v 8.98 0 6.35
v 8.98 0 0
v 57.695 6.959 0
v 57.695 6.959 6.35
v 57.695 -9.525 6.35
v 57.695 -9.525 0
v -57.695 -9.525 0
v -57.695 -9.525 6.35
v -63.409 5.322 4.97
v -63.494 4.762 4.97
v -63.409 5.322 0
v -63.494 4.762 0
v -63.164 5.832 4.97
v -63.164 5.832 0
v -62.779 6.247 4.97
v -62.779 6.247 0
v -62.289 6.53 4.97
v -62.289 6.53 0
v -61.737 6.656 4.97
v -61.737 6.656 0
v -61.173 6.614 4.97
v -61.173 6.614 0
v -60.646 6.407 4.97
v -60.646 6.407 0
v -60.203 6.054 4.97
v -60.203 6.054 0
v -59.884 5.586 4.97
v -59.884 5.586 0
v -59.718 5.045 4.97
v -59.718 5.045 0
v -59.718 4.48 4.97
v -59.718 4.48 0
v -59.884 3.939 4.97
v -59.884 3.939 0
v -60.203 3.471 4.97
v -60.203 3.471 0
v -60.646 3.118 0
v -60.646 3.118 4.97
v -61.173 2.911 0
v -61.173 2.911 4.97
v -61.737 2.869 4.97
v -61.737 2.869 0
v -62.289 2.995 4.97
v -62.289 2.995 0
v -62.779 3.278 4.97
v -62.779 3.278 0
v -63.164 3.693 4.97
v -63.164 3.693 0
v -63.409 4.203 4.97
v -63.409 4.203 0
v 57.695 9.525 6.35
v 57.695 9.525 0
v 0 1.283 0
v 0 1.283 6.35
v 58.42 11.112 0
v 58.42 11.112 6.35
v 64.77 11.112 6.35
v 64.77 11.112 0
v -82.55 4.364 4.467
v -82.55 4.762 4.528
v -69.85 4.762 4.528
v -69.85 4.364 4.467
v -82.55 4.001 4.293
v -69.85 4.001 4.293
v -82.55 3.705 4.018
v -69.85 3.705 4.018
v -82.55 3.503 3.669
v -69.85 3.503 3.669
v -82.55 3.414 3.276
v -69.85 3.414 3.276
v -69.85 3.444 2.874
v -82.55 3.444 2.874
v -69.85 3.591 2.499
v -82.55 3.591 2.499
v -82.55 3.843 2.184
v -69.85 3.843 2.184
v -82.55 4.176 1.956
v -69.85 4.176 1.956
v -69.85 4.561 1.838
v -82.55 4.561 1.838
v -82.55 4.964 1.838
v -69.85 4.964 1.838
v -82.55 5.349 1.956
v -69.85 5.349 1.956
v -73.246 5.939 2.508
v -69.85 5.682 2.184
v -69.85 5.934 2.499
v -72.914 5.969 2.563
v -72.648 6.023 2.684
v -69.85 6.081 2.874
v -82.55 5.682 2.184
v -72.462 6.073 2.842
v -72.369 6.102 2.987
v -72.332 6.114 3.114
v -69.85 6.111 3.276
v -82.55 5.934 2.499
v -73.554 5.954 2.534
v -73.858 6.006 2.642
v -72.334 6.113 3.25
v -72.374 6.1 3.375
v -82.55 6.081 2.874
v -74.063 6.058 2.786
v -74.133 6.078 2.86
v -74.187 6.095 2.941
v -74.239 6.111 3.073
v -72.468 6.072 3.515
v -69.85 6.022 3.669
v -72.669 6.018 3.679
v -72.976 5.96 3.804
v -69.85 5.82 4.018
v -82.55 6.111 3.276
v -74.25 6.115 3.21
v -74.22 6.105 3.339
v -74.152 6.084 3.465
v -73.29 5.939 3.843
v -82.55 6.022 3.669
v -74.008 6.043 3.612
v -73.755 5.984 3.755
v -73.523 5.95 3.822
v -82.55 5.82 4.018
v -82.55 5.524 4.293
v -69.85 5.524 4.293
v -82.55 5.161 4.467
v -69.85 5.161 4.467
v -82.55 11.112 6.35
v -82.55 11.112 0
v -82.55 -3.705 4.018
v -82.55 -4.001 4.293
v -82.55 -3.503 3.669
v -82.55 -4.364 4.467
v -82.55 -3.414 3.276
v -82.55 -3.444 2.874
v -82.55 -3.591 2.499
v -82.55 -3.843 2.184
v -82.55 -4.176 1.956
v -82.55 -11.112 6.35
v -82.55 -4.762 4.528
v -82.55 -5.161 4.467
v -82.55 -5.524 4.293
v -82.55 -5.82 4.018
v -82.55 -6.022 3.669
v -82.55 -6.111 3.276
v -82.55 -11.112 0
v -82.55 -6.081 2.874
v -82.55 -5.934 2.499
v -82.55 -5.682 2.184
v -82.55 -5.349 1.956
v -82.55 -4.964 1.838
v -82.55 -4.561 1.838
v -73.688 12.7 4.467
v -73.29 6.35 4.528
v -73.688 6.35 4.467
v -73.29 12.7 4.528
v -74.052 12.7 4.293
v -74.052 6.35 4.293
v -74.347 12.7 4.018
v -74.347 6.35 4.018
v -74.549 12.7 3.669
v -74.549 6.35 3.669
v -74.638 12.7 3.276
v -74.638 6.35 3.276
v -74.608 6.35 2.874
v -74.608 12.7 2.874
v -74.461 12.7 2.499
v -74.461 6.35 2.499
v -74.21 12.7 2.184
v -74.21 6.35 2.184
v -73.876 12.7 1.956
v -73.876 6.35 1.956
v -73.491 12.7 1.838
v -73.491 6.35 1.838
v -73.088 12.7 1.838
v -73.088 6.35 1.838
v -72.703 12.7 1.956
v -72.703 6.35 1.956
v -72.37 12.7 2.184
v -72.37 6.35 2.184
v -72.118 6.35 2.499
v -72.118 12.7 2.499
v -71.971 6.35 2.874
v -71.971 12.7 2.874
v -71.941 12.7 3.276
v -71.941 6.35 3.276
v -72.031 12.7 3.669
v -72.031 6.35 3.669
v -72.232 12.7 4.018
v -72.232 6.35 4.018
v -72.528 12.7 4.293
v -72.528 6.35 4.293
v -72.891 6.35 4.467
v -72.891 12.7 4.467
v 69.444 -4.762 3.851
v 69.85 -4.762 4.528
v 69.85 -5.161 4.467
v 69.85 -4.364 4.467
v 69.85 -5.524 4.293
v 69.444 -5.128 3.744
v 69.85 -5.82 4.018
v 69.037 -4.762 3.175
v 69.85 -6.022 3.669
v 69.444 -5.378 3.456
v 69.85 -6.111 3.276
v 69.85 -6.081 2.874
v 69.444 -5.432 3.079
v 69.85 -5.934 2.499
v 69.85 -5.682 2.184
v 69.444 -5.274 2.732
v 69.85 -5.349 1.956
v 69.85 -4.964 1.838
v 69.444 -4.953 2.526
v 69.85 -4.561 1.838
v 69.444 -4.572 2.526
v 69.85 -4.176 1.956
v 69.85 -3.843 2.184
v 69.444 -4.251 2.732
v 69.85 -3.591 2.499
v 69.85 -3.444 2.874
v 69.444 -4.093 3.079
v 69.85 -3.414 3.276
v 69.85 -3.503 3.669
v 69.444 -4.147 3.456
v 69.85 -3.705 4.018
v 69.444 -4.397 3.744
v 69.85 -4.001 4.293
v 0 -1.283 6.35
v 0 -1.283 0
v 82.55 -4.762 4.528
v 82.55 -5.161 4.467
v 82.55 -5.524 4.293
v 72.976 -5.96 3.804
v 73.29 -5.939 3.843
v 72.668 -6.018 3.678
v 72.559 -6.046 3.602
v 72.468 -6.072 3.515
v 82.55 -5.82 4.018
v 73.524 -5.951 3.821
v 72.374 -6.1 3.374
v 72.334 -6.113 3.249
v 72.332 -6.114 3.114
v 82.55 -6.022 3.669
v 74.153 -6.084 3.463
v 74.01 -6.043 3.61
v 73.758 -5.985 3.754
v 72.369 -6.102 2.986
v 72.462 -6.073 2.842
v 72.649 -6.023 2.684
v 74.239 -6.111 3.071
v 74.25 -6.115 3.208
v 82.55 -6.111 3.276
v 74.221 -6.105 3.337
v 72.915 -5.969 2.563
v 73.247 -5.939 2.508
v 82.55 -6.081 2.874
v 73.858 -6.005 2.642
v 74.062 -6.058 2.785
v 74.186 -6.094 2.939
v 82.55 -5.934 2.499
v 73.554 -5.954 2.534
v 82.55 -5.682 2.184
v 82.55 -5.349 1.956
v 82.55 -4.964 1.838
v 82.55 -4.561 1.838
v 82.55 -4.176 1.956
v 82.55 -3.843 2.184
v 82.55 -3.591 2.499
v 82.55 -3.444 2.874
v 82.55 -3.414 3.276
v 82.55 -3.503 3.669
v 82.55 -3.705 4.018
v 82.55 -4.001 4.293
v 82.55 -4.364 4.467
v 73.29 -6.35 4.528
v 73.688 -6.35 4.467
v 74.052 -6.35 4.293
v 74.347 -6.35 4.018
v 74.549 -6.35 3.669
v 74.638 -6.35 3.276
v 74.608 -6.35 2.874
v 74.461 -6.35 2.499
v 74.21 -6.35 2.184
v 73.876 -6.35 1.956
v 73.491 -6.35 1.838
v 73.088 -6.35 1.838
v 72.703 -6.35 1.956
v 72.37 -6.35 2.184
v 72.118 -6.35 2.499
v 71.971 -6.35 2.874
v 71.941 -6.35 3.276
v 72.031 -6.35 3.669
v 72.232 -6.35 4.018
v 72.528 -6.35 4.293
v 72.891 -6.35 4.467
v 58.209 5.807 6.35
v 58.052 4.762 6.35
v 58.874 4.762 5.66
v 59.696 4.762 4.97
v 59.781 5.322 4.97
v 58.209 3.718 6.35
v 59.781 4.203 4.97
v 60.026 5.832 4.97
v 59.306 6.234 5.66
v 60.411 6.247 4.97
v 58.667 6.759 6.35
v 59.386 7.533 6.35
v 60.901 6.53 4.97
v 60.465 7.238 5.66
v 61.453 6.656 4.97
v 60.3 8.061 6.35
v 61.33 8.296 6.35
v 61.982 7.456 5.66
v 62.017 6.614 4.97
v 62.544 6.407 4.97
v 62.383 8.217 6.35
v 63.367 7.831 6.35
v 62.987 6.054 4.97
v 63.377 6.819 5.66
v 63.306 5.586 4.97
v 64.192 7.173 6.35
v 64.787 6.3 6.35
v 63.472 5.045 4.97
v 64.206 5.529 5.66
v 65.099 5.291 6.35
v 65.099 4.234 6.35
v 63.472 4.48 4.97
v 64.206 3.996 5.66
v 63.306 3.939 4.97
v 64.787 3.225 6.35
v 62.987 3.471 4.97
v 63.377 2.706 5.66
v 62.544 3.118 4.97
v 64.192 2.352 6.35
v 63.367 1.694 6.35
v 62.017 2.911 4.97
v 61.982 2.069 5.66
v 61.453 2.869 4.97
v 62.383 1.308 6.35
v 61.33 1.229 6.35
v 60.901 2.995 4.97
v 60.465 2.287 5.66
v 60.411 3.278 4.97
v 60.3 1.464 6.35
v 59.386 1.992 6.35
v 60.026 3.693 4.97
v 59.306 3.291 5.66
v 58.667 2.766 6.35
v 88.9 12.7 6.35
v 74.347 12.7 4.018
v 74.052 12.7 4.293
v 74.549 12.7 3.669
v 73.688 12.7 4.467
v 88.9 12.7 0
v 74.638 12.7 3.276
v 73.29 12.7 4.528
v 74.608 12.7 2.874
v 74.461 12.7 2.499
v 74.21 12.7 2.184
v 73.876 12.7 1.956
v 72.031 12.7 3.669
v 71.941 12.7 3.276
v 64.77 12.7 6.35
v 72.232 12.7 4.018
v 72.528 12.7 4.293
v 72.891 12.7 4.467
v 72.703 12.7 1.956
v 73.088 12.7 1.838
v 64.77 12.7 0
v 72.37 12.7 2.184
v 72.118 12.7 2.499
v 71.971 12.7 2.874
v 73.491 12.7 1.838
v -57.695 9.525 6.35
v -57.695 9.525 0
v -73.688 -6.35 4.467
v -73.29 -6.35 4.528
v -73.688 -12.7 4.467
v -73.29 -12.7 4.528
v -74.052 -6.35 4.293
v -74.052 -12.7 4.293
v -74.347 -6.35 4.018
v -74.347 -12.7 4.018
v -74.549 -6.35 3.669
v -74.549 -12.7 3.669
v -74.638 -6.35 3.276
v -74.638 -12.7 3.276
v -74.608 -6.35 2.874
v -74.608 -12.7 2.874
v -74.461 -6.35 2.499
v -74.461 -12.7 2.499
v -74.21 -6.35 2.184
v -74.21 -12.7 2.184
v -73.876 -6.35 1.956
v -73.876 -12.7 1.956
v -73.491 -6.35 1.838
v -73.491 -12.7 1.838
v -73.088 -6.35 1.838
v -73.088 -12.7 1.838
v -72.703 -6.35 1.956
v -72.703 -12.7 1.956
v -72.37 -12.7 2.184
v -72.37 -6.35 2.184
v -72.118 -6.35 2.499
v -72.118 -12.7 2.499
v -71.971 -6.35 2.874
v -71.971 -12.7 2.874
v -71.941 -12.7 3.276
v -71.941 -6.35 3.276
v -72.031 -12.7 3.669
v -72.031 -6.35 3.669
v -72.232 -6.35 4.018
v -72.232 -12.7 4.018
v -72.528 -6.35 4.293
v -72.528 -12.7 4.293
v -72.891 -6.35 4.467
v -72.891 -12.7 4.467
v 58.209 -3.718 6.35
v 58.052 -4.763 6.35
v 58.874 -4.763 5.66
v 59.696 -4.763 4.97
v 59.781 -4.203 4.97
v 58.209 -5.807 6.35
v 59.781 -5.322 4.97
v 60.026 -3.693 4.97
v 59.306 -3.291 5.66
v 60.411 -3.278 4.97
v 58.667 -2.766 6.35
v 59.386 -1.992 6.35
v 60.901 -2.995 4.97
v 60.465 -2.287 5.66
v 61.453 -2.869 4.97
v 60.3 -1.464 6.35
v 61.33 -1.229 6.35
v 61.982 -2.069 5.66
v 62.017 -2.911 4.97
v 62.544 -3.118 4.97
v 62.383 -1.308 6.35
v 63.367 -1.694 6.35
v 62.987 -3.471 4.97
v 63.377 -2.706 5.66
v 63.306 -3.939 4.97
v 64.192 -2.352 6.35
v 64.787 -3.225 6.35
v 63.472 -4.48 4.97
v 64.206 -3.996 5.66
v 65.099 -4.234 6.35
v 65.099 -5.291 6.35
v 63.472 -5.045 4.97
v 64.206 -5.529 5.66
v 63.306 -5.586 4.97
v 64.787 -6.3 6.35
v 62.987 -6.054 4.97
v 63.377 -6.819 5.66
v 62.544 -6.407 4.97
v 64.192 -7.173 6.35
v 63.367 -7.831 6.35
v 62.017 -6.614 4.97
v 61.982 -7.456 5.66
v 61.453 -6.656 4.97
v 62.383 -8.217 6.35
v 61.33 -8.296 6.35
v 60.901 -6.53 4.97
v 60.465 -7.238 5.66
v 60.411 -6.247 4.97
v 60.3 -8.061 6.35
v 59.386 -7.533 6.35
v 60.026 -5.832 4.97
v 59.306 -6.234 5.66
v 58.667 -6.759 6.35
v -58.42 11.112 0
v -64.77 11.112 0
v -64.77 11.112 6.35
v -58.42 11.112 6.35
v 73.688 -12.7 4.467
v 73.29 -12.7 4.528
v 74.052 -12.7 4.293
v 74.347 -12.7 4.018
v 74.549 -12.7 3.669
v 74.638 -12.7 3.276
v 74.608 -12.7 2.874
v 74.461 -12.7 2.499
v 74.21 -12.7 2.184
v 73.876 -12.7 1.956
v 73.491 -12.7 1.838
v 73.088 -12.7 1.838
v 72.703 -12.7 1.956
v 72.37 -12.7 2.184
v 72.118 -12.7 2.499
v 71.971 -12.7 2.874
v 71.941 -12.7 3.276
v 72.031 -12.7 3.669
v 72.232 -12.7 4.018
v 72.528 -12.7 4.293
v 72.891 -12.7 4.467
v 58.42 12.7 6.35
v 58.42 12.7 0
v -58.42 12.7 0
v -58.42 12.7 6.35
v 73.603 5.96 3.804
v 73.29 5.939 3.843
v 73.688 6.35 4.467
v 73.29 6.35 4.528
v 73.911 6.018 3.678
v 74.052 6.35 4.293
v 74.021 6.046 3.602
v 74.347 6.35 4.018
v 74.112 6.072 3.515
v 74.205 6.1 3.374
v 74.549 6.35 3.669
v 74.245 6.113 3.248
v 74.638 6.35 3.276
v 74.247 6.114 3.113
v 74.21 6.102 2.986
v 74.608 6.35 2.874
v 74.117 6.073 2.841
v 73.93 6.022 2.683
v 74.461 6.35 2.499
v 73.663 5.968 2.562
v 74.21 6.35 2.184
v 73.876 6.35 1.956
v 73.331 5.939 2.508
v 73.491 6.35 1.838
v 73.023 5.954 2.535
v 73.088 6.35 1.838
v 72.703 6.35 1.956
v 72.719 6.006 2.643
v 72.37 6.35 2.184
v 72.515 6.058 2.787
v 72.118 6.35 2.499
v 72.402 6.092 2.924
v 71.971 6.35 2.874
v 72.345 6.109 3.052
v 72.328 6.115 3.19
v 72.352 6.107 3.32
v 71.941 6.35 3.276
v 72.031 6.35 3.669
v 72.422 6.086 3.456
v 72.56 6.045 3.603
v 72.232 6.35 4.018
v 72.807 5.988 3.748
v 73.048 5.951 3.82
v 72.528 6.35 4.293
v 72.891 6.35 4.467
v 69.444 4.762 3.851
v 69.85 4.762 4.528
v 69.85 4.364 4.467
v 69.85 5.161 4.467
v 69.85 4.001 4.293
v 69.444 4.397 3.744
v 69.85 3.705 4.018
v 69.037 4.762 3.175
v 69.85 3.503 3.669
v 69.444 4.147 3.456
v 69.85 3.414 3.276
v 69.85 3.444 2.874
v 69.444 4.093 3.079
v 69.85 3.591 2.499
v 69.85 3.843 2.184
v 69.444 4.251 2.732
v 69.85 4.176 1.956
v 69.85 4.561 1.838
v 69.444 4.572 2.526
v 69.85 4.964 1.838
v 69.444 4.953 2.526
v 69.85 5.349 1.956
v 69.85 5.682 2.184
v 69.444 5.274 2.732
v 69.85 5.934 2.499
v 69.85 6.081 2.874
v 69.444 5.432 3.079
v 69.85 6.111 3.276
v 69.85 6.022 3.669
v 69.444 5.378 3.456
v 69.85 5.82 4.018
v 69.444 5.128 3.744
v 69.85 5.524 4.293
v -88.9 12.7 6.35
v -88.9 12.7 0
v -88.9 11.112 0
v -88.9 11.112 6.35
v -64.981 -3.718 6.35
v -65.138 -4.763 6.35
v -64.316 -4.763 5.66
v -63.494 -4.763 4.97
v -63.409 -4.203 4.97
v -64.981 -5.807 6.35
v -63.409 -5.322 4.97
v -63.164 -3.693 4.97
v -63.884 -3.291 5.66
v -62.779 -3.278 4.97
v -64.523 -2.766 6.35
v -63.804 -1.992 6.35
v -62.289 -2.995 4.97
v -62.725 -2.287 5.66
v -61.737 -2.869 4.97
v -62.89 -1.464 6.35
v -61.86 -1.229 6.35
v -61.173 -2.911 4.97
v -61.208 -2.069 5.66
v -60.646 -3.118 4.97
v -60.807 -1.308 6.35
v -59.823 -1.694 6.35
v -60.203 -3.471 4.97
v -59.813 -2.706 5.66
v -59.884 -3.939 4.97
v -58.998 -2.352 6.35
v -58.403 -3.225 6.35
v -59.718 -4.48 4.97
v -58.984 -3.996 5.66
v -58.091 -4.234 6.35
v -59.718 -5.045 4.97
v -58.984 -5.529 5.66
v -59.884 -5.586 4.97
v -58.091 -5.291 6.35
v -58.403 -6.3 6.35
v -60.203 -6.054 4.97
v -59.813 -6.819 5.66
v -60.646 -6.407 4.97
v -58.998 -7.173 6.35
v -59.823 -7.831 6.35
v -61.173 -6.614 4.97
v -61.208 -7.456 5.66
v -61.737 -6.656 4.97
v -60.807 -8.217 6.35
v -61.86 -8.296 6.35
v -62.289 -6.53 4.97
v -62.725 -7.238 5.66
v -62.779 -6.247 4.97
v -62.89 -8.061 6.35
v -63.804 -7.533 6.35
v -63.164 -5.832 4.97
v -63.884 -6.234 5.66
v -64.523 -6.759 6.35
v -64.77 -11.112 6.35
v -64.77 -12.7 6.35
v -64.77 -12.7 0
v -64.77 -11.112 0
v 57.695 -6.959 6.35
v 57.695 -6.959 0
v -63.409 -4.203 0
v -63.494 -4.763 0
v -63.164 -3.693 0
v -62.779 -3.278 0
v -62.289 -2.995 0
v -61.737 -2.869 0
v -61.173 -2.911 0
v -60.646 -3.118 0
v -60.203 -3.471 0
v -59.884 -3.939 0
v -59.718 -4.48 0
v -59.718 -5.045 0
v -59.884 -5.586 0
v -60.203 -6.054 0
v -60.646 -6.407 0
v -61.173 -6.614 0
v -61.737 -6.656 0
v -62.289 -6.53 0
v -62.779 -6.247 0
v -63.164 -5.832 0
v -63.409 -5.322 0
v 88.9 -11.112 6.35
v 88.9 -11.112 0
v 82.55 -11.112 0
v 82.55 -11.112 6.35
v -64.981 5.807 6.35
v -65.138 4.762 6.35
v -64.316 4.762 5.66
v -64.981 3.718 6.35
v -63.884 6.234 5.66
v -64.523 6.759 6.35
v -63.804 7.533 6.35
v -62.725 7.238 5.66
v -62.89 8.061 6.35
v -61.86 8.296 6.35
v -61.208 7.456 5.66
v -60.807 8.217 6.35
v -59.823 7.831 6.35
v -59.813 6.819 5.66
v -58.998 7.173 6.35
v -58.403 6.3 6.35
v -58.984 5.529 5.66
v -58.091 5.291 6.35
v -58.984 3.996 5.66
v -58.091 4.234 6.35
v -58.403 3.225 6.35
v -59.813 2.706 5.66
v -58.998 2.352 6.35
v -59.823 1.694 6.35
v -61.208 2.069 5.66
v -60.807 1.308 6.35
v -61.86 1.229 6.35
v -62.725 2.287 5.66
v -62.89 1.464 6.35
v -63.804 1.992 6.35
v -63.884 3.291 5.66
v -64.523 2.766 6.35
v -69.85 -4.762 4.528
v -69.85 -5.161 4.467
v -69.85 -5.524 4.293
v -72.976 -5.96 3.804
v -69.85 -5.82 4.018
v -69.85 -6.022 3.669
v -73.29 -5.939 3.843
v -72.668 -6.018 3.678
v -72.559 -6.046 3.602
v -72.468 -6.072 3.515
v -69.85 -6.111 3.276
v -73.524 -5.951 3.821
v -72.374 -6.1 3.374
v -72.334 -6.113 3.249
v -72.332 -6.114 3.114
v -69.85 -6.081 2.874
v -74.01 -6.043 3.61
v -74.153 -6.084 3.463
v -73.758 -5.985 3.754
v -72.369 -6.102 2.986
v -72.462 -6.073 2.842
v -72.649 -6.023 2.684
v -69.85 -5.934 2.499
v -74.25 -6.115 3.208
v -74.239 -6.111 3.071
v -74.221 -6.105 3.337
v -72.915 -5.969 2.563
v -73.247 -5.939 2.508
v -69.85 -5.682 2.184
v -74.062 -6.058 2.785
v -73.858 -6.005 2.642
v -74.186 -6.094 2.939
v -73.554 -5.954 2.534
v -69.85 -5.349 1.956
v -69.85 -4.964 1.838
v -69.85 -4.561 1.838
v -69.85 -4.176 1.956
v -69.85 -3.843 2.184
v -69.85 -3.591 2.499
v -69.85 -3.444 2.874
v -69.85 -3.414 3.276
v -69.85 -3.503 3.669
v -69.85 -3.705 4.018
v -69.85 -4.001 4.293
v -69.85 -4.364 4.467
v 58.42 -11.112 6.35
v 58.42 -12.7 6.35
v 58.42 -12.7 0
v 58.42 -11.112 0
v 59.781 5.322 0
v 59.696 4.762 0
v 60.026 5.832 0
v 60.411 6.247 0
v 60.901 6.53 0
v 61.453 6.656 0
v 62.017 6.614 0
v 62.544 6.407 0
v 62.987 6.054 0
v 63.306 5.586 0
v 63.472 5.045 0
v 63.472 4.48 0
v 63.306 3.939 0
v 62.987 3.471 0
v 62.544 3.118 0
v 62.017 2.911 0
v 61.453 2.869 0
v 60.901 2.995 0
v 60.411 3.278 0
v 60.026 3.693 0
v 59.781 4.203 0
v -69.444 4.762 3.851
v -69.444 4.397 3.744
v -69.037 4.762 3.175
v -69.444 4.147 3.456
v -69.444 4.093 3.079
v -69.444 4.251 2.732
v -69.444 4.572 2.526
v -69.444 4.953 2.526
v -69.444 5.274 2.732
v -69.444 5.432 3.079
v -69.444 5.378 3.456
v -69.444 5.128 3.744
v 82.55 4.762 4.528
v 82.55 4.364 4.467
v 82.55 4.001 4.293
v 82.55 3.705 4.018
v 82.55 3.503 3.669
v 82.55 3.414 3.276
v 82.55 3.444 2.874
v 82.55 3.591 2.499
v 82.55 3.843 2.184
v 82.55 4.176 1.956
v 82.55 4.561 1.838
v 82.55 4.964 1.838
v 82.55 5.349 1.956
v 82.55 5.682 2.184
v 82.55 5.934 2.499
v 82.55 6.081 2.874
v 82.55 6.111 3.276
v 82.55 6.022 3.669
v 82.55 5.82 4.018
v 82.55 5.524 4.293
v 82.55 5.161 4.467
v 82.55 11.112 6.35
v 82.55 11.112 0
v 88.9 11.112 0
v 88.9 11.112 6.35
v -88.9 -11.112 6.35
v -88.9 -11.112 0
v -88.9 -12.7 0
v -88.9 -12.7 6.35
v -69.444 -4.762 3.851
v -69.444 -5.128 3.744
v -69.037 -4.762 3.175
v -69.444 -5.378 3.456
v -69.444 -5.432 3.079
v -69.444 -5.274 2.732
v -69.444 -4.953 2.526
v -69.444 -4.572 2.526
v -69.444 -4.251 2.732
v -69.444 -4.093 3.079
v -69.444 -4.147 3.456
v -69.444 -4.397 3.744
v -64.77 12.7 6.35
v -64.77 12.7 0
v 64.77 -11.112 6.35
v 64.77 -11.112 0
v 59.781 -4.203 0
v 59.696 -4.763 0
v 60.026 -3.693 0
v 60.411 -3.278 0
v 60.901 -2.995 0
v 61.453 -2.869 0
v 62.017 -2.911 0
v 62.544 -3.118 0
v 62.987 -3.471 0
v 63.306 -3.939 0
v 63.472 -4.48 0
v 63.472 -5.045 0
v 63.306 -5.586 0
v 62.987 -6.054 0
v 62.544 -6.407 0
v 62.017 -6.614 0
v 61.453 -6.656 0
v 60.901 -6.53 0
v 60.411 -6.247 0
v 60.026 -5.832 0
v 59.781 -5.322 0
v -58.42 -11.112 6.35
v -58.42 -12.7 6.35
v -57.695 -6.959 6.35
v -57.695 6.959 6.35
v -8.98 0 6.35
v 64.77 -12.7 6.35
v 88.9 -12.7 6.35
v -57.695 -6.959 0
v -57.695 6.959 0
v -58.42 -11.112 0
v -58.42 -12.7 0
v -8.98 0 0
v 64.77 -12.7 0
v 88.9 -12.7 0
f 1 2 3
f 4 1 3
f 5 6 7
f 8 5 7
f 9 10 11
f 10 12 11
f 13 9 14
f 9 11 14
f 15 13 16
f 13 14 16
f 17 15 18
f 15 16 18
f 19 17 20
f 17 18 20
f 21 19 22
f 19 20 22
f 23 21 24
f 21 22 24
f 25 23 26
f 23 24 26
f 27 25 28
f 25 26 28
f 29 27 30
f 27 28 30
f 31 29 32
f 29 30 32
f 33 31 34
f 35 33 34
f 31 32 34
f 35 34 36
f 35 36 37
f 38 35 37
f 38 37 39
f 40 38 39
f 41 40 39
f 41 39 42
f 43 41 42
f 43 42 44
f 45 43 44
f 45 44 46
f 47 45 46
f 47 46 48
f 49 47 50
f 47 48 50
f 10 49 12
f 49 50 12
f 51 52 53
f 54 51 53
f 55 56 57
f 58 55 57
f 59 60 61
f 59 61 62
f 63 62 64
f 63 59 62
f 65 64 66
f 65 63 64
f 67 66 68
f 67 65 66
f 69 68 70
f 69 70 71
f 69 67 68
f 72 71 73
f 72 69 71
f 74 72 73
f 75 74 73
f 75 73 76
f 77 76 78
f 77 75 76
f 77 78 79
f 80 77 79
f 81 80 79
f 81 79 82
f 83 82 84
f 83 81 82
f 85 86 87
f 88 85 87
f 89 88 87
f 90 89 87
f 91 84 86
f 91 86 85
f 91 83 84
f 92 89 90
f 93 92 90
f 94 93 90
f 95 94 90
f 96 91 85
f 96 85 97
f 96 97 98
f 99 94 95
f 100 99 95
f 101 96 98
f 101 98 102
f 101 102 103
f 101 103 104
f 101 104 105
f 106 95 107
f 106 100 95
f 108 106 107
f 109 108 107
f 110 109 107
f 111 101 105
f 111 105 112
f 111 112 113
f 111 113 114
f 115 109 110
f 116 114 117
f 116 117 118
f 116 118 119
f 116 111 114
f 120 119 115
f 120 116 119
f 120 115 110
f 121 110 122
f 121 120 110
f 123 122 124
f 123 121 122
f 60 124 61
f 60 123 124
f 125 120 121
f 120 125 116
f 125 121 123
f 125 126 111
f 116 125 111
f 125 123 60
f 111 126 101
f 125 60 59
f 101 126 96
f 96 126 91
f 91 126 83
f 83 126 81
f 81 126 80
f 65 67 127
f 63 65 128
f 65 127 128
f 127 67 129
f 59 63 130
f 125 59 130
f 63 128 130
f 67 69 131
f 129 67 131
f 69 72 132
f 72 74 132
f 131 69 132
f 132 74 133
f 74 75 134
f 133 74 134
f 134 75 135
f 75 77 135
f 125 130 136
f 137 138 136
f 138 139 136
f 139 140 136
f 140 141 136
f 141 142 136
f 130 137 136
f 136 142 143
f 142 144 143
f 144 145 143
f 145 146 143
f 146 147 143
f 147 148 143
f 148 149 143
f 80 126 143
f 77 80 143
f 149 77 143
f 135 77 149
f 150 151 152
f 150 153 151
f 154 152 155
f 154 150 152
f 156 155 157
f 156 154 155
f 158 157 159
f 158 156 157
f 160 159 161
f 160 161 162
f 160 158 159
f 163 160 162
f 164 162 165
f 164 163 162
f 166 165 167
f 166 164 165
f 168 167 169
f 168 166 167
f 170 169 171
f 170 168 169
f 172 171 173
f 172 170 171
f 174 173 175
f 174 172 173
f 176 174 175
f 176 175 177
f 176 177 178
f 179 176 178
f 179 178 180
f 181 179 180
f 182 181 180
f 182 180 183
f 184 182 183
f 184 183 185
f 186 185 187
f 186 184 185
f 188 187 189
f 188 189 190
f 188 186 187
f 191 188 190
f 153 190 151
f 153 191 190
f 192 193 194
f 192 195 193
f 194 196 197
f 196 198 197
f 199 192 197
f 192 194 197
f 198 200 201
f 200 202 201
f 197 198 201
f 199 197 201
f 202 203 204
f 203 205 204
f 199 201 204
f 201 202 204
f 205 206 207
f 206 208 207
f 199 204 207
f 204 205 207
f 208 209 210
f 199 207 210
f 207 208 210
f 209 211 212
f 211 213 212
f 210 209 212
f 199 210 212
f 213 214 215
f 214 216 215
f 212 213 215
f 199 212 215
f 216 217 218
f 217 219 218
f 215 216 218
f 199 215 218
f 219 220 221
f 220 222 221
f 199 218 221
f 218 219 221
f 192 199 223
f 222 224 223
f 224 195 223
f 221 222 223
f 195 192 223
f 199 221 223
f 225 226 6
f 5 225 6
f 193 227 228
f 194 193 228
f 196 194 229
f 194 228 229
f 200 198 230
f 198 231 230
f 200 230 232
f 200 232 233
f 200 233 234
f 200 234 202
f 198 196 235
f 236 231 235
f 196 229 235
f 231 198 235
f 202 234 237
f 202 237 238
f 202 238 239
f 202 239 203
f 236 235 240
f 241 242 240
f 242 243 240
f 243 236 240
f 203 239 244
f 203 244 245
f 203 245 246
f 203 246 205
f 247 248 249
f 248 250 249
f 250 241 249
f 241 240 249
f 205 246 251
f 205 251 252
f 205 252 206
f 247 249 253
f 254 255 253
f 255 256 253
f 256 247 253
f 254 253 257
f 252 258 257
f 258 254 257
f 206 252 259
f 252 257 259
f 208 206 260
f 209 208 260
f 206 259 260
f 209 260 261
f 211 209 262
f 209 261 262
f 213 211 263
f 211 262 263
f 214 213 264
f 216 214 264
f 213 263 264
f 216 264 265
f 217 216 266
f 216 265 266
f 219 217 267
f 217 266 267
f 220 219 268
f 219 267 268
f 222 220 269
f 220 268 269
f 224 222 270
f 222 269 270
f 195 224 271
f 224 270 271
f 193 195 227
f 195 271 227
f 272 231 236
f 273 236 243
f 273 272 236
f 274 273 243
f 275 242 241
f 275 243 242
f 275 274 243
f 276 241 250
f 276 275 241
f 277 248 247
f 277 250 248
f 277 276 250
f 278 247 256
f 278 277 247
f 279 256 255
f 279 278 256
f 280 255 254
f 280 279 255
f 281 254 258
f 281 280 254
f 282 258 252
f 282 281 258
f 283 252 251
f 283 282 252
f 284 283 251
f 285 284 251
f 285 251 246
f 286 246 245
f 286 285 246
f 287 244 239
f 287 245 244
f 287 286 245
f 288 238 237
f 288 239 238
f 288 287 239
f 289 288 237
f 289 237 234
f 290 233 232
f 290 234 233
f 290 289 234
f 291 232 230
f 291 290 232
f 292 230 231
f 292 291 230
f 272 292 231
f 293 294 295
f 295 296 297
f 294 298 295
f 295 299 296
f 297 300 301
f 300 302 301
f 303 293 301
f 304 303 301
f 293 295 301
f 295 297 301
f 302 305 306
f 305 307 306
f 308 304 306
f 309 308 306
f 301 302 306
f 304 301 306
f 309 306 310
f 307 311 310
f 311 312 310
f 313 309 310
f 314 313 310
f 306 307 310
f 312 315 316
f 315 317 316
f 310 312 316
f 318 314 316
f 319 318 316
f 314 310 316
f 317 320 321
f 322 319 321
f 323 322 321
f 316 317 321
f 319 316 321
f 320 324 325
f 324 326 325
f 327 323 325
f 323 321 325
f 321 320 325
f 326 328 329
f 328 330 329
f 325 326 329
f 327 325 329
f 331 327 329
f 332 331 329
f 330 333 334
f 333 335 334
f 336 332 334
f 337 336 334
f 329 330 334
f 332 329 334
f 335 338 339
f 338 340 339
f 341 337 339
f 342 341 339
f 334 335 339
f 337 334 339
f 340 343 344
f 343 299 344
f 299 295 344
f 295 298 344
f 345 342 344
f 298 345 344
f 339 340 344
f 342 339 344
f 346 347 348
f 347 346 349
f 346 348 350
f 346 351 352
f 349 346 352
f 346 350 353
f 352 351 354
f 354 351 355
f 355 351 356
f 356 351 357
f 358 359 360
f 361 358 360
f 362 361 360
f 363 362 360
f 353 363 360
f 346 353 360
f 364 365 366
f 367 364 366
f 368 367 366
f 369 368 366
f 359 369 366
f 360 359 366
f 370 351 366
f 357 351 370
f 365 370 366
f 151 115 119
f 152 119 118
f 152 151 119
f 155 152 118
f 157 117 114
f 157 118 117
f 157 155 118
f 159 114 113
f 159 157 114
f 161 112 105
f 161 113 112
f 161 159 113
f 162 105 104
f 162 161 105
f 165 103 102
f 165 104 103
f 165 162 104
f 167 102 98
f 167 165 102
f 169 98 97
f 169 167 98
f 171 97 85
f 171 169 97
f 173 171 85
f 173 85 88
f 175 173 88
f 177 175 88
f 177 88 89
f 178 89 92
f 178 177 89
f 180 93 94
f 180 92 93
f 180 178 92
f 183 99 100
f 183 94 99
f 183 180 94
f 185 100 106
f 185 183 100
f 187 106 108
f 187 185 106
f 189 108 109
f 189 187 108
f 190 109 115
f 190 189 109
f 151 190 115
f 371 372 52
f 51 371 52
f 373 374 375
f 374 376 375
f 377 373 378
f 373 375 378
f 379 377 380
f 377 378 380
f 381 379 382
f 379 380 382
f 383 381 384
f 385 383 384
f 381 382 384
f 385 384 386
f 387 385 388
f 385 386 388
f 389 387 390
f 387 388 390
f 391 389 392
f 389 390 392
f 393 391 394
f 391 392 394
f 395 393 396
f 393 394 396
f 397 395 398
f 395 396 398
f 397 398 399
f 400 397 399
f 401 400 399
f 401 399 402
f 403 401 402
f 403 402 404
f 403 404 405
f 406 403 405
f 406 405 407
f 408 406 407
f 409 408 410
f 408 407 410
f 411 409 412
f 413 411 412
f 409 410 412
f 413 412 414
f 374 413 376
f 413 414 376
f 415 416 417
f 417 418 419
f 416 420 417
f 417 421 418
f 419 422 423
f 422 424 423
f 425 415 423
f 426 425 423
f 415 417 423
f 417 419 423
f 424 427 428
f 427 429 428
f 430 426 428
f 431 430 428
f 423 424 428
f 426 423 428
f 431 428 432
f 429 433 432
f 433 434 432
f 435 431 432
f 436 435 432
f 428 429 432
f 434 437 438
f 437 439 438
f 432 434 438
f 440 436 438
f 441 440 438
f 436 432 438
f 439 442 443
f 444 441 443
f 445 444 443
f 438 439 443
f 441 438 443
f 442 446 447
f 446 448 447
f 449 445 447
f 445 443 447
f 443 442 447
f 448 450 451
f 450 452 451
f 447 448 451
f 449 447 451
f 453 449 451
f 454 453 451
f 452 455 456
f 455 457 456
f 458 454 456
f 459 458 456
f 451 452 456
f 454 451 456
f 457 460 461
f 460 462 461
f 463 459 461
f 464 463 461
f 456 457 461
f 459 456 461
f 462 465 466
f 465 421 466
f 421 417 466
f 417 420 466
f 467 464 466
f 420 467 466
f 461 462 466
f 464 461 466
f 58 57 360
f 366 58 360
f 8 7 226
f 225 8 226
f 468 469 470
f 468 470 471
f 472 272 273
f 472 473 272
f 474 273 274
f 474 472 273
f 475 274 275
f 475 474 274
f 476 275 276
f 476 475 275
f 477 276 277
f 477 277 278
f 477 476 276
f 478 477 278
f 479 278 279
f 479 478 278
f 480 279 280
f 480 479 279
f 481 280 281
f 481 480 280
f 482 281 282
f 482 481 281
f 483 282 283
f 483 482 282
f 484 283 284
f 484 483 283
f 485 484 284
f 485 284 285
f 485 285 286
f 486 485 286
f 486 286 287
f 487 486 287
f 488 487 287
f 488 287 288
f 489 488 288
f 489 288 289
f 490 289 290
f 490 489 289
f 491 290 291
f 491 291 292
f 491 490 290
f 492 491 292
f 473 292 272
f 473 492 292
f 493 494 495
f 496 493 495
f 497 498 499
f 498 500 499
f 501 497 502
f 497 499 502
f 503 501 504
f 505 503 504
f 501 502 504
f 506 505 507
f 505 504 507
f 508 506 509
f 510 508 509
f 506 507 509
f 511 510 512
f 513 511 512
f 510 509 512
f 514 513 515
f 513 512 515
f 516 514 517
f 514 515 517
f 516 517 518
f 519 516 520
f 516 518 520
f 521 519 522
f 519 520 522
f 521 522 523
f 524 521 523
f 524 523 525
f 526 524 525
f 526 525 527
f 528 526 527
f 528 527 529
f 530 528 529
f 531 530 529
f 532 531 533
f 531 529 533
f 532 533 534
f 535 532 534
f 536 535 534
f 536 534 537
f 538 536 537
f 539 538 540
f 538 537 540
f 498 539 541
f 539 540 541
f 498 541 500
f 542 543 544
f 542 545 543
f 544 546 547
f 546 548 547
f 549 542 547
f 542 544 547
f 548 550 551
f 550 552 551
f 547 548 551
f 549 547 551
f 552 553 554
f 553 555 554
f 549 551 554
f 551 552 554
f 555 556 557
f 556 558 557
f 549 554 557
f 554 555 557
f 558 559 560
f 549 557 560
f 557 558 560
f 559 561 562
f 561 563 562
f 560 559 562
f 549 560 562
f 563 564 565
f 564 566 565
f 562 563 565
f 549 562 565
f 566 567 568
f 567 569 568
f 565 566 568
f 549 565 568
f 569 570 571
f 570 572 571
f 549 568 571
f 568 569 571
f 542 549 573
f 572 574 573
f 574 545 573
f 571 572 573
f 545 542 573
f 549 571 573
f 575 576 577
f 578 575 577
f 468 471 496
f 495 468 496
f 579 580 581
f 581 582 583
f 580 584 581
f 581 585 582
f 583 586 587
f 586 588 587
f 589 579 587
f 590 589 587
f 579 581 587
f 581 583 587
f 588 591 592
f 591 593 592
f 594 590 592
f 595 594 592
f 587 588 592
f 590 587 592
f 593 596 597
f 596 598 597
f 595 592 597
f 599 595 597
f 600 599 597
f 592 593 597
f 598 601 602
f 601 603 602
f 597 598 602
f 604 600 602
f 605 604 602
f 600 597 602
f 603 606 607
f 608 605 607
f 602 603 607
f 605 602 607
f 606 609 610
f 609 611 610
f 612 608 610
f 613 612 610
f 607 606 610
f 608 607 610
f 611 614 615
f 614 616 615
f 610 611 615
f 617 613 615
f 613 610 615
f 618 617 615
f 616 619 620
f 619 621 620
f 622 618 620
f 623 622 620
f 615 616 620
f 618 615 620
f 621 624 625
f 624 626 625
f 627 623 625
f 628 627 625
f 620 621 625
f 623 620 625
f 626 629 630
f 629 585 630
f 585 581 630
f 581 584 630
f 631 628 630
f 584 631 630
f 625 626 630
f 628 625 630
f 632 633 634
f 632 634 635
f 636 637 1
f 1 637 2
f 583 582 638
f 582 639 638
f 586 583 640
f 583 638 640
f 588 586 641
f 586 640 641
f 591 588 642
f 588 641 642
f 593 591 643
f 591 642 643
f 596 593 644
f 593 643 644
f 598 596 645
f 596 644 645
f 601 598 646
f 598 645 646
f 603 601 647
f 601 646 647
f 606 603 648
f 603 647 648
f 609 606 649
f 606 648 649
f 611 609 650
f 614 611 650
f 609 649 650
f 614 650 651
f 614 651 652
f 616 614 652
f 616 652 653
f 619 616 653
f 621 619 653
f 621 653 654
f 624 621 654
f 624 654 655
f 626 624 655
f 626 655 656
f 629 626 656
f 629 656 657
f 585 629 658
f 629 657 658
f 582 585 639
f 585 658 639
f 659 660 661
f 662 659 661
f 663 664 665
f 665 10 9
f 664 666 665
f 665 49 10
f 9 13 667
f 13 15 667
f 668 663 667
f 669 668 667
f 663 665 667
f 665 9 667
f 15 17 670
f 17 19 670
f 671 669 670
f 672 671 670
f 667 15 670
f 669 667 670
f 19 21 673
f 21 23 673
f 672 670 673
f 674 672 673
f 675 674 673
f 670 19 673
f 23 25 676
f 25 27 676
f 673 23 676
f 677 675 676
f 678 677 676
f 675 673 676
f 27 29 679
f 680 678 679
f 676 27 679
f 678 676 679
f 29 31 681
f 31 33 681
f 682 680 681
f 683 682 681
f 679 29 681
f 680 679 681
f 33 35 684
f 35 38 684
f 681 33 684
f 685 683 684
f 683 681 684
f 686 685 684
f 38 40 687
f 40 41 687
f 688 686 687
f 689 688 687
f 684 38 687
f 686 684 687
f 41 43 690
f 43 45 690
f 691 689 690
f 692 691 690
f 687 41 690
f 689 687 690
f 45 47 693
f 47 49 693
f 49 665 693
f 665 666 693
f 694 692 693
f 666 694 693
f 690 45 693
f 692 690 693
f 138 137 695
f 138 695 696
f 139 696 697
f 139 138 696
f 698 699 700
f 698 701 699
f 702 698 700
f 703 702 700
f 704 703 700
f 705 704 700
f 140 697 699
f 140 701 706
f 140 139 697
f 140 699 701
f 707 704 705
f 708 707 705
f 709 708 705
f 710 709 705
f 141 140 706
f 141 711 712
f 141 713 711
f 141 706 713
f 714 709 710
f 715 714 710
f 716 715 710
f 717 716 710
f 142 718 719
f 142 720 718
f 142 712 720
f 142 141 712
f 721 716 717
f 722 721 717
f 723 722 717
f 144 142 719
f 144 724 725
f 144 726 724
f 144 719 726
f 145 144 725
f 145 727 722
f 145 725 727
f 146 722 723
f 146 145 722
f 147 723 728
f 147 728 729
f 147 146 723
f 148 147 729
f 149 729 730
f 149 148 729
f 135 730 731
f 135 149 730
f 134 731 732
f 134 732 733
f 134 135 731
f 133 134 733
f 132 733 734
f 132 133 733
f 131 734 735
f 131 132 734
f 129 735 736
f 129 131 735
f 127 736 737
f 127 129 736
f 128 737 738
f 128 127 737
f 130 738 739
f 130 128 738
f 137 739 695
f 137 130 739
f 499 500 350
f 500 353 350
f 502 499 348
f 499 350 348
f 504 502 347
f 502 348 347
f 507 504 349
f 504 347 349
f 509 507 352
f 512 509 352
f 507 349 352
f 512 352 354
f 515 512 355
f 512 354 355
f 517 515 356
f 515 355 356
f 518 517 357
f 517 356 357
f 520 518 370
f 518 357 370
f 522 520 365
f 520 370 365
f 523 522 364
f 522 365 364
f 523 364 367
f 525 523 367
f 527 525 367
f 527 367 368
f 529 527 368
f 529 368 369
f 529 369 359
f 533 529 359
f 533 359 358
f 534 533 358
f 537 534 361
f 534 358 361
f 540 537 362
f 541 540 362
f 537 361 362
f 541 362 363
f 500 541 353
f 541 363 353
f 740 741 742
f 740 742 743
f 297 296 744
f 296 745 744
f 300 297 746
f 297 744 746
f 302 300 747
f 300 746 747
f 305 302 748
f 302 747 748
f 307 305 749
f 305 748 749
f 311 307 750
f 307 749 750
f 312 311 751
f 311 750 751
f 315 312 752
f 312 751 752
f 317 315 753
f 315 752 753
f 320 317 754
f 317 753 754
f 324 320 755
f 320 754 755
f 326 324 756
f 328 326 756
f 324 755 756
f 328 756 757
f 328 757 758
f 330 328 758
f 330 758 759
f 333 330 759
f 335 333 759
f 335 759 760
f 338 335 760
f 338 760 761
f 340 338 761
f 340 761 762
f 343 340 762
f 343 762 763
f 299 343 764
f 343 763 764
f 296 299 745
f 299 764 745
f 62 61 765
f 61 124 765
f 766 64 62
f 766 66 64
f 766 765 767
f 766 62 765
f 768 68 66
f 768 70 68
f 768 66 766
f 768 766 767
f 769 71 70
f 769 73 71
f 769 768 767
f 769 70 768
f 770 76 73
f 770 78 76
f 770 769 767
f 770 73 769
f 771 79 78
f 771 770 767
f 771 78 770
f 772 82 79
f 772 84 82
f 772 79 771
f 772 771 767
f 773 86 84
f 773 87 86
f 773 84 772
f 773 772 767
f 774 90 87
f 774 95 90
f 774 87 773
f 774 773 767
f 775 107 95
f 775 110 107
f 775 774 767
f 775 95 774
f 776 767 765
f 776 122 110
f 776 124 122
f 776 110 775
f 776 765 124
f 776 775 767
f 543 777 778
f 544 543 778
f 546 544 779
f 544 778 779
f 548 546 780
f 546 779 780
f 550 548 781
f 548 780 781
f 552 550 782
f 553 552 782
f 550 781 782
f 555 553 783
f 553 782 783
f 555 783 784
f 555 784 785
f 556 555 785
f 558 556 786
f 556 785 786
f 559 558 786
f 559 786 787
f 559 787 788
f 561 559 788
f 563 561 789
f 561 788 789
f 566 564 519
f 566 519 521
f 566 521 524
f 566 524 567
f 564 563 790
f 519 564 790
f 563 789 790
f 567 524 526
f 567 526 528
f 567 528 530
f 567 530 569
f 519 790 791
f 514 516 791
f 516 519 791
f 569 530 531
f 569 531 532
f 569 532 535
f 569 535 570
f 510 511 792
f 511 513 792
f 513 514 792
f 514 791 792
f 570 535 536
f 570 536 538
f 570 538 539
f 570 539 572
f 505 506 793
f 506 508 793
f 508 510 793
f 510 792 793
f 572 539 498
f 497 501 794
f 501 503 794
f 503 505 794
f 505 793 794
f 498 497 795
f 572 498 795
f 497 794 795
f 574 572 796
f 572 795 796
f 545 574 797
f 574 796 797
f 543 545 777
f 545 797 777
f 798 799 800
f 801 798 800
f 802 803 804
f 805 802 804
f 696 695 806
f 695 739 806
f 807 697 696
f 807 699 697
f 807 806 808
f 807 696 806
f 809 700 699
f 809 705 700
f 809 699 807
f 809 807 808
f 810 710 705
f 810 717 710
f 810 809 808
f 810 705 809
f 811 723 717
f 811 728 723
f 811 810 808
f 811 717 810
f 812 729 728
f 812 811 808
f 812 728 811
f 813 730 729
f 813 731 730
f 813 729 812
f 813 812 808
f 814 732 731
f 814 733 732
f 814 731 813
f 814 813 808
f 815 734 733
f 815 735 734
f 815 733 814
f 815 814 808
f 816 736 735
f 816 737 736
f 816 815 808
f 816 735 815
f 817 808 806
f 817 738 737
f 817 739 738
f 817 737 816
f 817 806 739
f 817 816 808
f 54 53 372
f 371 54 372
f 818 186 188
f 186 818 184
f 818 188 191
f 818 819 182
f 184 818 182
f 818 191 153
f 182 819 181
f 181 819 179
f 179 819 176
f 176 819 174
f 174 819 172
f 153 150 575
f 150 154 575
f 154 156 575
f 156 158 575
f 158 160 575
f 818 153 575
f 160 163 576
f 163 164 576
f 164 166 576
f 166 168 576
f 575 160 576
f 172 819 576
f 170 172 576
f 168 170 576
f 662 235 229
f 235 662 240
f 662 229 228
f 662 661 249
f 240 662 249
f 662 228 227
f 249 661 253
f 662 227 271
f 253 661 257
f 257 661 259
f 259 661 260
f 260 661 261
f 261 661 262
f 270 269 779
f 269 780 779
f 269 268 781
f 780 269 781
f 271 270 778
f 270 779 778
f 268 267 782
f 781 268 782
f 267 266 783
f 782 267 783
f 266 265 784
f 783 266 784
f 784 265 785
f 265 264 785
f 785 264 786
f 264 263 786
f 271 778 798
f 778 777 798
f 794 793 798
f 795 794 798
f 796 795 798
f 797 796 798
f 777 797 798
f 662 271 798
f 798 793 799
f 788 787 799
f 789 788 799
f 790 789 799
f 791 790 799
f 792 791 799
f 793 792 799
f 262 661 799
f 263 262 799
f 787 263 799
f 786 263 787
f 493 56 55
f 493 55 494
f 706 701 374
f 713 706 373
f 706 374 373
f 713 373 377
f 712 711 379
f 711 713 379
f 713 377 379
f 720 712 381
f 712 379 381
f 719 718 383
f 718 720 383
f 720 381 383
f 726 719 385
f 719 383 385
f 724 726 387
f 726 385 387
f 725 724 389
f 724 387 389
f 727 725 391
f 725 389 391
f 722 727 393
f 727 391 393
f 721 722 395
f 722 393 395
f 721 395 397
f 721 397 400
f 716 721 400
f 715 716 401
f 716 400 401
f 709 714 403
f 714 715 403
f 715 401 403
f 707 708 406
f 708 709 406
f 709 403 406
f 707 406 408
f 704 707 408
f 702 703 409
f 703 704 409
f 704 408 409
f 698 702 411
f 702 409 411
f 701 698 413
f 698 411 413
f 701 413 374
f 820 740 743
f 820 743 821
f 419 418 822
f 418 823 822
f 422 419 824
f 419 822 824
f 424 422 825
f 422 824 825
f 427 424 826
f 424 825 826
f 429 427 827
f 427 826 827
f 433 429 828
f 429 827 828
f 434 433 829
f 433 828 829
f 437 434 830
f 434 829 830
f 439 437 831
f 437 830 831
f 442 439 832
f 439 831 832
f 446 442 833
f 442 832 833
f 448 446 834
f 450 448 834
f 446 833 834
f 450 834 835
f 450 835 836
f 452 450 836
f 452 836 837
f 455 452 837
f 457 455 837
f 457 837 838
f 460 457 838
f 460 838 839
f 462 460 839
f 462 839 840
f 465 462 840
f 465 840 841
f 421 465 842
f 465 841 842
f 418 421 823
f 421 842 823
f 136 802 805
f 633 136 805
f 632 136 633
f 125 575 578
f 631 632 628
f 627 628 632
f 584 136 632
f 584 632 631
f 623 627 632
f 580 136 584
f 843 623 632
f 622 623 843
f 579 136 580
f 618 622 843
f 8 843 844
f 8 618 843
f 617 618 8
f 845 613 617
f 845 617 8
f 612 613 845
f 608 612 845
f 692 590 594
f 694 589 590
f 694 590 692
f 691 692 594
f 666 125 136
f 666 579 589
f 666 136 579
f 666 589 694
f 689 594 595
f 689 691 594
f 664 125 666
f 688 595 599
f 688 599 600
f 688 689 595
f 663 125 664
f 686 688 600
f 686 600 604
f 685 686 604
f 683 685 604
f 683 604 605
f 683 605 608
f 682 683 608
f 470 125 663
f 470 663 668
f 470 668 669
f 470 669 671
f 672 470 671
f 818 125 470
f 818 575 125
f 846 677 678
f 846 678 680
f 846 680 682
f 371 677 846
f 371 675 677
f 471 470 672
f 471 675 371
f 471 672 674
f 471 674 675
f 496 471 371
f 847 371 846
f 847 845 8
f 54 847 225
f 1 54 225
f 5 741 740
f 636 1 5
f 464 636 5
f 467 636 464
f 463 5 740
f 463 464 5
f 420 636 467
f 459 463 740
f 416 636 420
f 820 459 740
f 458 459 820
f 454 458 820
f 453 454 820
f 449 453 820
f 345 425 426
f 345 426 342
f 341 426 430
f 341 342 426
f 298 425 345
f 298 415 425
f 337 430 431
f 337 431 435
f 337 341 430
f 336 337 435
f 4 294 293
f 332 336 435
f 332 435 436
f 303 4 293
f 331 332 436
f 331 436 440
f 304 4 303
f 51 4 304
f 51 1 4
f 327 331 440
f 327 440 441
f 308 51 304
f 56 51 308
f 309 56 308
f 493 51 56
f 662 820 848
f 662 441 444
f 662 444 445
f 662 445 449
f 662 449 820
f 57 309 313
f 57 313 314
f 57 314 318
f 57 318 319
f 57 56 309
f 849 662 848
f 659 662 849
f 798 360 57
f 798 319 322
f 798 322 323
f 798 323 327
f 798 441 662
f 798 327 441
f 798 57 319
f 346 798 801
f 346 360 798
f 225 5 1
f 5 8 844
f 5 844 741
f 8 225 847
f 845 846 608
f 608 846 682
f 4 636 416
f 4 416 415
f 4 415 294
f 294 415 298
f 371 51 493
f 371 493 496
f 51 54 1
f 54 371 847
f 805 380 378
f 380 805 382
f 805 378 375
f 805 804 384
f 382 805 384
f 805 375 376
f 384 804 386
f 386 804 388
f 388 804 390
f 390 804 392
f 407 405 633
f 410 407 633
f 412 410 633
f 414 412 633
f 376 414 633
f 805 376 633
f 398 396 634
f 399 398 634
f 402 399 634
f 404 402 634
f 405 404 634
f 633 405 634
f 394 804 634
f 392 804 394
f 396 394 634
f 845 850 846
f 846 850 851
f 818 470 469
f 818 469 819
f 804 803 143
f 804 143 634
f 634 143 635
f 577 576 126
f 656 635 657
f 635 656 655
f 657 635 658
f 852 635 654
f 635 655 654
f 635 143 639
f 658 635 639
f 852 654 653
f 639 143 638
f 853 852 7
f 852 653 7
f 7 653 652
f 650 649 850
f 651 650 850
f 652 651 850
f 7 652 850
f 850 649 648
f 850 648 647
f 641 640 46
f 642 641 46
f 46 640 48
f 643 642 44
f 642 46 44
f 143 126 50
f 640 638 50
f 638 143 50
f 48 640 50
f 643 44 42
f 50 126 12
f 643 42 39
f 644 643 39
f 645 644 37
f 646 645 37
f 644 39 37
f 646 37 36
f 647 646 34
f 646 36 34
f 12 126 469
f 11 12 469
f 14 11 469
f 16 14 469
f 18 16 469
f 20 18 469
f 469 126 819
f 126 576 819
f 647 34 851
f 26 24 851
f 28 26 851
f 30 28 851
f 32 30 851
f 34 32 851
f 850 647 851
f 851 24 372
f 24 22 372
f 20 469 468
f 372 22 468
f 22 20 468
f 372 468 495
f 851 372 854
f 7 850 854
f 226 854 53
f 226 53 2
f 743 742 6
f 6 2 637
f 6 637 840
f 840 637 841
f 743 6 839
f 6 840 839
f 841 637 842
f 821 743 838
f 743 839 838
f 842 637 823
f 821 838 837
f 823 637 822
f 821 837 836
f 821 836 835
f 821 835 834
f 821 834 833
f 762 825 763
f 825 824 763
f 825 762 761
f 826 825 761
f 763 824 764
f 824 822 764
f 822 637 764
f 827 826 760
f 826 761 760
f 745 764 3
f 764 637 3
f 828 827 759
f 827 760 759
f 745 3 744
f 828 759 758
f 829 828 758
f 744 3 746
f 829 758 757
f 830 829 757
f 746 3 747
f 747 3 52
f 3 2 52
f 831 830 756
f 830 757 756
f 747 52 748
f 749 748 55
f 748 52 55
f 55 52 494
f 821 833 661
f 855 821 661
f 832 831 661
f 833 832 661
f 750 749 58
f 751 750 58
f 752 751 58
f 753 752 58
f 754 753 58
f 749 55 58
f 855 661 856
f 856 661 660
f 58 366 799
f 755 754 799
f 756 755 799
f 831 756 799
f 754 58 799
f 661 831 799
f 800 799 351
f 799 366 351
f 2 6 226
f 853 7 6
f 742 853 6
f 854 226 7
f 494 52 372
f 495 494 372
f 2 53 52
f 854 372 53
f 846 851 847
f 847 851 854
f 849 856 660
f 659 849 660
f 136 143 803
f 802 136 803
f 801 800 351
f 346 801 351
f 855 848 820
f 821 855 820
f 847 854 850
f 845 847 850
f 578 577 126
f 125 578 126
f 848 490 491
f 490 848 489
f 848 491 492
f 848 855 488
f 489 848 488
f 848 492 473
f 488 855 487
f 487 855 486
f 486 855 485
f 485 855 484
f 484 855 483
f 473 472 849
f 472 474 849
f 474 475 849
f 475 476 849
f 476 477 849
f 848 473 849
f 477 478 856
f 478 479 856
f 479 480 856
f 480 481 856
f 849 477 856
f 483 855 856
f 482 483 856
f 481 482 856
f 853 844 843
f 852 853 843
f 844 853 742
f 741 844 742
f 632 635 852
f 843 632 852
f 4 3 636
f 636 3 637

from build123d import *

# Parameters (mm, degrees)
BOSS_EXTRUDE1_DEPTH                               = 6.35
TAP_DRILL_FOR_6_32_TAP1_AT_2_COUNT                = 2
TAP_DRILL_FOR_6_32_TAP1_AT_2_PITCH                = 9.525
SKETCH7_W                                         = 6.35
SKETCH7_H                                         = 1.5875
CUT_EXTRUDE1_DEPTH                                = 91.02678768
CSK_FOR_6_FLAT_HEAD_MACHINE_SCREW_100_D           = 3.7973
CSK_FOR_6_FLAT_HEAD_MACHINE_SCREW_100_CSINK_D     = 7.0866
CSK_FOR_6_FLAT_HEAD_MACHINE_SCREW_100_CSINK_ANGLE = 100


with BuildPart() as part:
    # Sketch1 → Boss-Extrude1 (new body)
    with BuildSketch(Plane.XY):
        Polygon((-57.694743879, -6.959212537), (-57.694743879, 6.959212537), (-82.55, 10.509963411), (-82.55, -10.509963411), align=None)
        Polygon((57.694743879, -9.525), (-57.694743879, -9.525), (-79.919743879, -12.7), (79.919743879, -12.7), align=None)
        Polygon((-57.694743879, -9.525), (-57.694743879, -6.959212537), (-82.55, -10.509963411), (-82.55, -11.1125), (-86.767756121, -11.1125), (-88.9, -11.417106268), (-88.9, -12.7), (-79.919743879, -12.7), align=None)
        Polygon((0, -1.282893732), (-8.980256121, 0), (-57.694743879, -6.959212537), (-57.694743879, -9.525), align=None)
        Polygon((0, 1.282893732), (-57.694743879, 9.525), (-57.694743879, 6.959212537), (-8.980256121, 0), align=None)
        Polygon((79.919743879, 12.7), (-79.919743879, 12.7), (-57.694743879, 9.525), (57.694743879, 9.525), align=None)
        Polygon((-79.919743879, 12.7), (-88.9, 12.7), (-88.9, 11.417106268), (-86.767756121, 11.1125), (-82.55, 11.1125), (-82.55, 10.509963411), (-57.694743879, 6.959212537), (-57.694743879, 9.525), align=None)
        Polygon((57.694743879, -6.959212537), (8.980256121, 0), (0, -1.282893732), (57.694743879, -9.525), align=None)
        Polygon((57.694743879, 6.959212537), (57.694743879, 9.525), (0, 1.282893732), (8.980256121, 0), align=None)
        Polygon((8.980256121, 0), (0, 1.282893732), (-8.980256121, 0), (0, -1.282893732), align=None)
        Polygon((82.55, -10.509963411), (57.694743879, -6.959212537), (57.694743879, -9.525), (79.919743879, -12.7), (88.9, -12.7), (88.9, -11.417106268), (86.767756121, -11.1125), (82.55, -11.1125), align=None)
        Polygon((88.9, 12.7), (79.919743879, 12.7), (57.694743879, 9.525), (57.694743879, 6.959212537), (82.55, 10.509963411), (82.55, 11.1125), (86.767756121, 11.1125), (88.9, 11.417106268), align=None)
        Polygon((88.9, 11.1125), (88.9, 11.417106268), (86.767756121, 11.1125), align=None)
        Polygon((88.9, -11.1125), (86.767756121, -11.1125), (88.9, -11.417106268), align=None)
        Polygon((82.55, 10.509963411), (57.694743879, 6.959212537), (57.694743879, -6.959212537), (82.55, -10.509963411), align=None)
        Polygon((-88.9, -11.417106268), (-86.767756121, -11.1125), (-88.9, -11.1125), align=None)
        Polygon((-86.767756121, 11.1125), (-88.9, 11.417106268), (-88.9, 11.1125), align=None)
    extrude(amount=BOSS_EXTRUDE1_DEPTH)

    # Sketch4 → Tap Drill for #6-32 Tap1 (revolve, cut)
    with BuildSketch(Plane(origin=(-82.55, 4.7625, 3.175), x_dir=(0, 0, 1), z_dir=(0, 1, 0))):
        Polygon((0, 0), (0, 13.51269403), (1.35255, 12.7), (1.35255, 0), align=None)
    tap_drill_for_6_32_tap1 = revolve(axis=Axis((-88.9, 4.7625, 3.175), (1, 0, 0)), mode=Mode.SUBTRACT)

    # Tap Drill for #6-32 Tap1 at 2: Tap Drill for #6-32 Tap1 ×2
    with Locations(*[(0, -i * TAP_DRILL_FOR_6_32_TAP1_AT_2_PITCH, 0) for i in range(1, TAP_DRILL_FOR_6_32_TAP1_AT_2_COUNT)]):
        add(tap_drill_for_6_32_tap1, mode=Mode.SUBTRACT)

    # Mirror1: Tap Drill for #6-32 Tap1 across plane
    add(tap_drill_for_6_32_tap1.mirror(Plane(origin=(0, 0, 0), x_dir=(0, 0, 1), z_dir=(1, 0, 0))), mode=Mode.SUBTRACT)

    # Mirror1 copy 1 sketch → Mirror1 copy 1 (revolve, cut)
    with BuildSketch(Plane(origin=(82.55, -4.7625, 3.175), x_dir=(0, 0, 1), z_dir=(0, 1, 0))):
        Polygon((0, 0), (0, -13.51269403), (1.35255, -12.7), (1.35255, 0), align=None)
    revolve(axis=Axis((88.9, -4.7625, 3.175), (1, 0, 0)), mode=Mode.SUBTRACT)

    # Sketch5 → Tap Drill for #6-32 Tap2 (revolve, cut)
    with BuildSketch(Plane(origin=(-73.289583418, 12.7, 3.175), x_dir=(0, 0, 1), z_dir=(1, 0, 0))):
        Polygon((0, 0), (0, 7.16269403), (1.35255, 6.35), (1.35255, 0), align=None)
    tap_drill_for_6_32_tap2 = revolve(axis=Axis((-73.289583418, 19.05, 3.175), (0, -1, 0)), mode=Mode.SUBTRACT)

    # Mirror2: Tap Drill for #6-32 Tap2 across plane
    add(tap_drill_for_6_32_tap2.mirror(Plane(origin=(0, 0, 0), x_dir=(0, 0, 1), z_dir=(1, 0, 0))), mode=Mode.SUBTRACT)

    # Mirror3: Tap Drill for #6-32 Tap2 across plane
    add(tap_drill_for_6_32_tap2.mirror(Plane(origin=(0, 0, 0), x_dir=(0, 0, 1), z_dir=(0, -1, 0))), mode=Mode.SUBTRACT)

    # Mirror3 copy 1 sketch → Mirror3 copy 1 (revolve, cut)
    with BuildSketch(Plane(origin=(73.289583418, -12.7, 3.175), x_dir=(0, 0, 1), z_dir=(-1, 0, 0))):
        Polygon((0, 0), (0, 7.16269403), (1.35255, 6.35), (1.35255, 0), align=None)
    revolve(axis=Axis((73.289583418, -19.05, 3.175), (0, 1, 0)), mode=Mode.SUBTRACT)

    # Sketch7 → Cut-Extrude1 (cut, through all)
    with BuildSketch(Plane.XY.offset(6.35)):
        with Locations((-61.595, 11.90625)):
            Rectangle(SKETCH7_W, SKETCH7_H)
        with Locations((-61.595, -11.90625)):
            Rectangle(SKETCH7_W, SKETCH7_H)
        with Locations((61.595, -11.90625)):
            Rectangle(SKETCH7_W, SKETCH7_H)
        with Locations((61.595, 11.90625)):
            Rectangle(SKETCH7_W, SKETCH7_H)
    extrude(amount=-CUT_EXTRUDE1_DEPTH, mode=Mode.SUBTRACT)

    # CSK for #6 Flat Head Machine Screw (100)1 (through all)
    with Locations(Plane.XY.offset(6.35)):
        with Locations((-61.595, 4.7625), (-61.595, -4.7625), (61.595, -4.7625), (61.595, 4.7625)):
            CounterSinkHole(CSK_FOR_6_FLAT_HEAD_MACHINE_SCREW_100_D / 2, CSK_FOR_6_FLAT_HEAD_MACHINE_SCREW_100_CSINK_D / 2, counter_sink_angle=CSK_FOR_6_FLAT_HEAD_MACHINE_SCREW_100_CSINK_ANGLE)


solid = part.part
